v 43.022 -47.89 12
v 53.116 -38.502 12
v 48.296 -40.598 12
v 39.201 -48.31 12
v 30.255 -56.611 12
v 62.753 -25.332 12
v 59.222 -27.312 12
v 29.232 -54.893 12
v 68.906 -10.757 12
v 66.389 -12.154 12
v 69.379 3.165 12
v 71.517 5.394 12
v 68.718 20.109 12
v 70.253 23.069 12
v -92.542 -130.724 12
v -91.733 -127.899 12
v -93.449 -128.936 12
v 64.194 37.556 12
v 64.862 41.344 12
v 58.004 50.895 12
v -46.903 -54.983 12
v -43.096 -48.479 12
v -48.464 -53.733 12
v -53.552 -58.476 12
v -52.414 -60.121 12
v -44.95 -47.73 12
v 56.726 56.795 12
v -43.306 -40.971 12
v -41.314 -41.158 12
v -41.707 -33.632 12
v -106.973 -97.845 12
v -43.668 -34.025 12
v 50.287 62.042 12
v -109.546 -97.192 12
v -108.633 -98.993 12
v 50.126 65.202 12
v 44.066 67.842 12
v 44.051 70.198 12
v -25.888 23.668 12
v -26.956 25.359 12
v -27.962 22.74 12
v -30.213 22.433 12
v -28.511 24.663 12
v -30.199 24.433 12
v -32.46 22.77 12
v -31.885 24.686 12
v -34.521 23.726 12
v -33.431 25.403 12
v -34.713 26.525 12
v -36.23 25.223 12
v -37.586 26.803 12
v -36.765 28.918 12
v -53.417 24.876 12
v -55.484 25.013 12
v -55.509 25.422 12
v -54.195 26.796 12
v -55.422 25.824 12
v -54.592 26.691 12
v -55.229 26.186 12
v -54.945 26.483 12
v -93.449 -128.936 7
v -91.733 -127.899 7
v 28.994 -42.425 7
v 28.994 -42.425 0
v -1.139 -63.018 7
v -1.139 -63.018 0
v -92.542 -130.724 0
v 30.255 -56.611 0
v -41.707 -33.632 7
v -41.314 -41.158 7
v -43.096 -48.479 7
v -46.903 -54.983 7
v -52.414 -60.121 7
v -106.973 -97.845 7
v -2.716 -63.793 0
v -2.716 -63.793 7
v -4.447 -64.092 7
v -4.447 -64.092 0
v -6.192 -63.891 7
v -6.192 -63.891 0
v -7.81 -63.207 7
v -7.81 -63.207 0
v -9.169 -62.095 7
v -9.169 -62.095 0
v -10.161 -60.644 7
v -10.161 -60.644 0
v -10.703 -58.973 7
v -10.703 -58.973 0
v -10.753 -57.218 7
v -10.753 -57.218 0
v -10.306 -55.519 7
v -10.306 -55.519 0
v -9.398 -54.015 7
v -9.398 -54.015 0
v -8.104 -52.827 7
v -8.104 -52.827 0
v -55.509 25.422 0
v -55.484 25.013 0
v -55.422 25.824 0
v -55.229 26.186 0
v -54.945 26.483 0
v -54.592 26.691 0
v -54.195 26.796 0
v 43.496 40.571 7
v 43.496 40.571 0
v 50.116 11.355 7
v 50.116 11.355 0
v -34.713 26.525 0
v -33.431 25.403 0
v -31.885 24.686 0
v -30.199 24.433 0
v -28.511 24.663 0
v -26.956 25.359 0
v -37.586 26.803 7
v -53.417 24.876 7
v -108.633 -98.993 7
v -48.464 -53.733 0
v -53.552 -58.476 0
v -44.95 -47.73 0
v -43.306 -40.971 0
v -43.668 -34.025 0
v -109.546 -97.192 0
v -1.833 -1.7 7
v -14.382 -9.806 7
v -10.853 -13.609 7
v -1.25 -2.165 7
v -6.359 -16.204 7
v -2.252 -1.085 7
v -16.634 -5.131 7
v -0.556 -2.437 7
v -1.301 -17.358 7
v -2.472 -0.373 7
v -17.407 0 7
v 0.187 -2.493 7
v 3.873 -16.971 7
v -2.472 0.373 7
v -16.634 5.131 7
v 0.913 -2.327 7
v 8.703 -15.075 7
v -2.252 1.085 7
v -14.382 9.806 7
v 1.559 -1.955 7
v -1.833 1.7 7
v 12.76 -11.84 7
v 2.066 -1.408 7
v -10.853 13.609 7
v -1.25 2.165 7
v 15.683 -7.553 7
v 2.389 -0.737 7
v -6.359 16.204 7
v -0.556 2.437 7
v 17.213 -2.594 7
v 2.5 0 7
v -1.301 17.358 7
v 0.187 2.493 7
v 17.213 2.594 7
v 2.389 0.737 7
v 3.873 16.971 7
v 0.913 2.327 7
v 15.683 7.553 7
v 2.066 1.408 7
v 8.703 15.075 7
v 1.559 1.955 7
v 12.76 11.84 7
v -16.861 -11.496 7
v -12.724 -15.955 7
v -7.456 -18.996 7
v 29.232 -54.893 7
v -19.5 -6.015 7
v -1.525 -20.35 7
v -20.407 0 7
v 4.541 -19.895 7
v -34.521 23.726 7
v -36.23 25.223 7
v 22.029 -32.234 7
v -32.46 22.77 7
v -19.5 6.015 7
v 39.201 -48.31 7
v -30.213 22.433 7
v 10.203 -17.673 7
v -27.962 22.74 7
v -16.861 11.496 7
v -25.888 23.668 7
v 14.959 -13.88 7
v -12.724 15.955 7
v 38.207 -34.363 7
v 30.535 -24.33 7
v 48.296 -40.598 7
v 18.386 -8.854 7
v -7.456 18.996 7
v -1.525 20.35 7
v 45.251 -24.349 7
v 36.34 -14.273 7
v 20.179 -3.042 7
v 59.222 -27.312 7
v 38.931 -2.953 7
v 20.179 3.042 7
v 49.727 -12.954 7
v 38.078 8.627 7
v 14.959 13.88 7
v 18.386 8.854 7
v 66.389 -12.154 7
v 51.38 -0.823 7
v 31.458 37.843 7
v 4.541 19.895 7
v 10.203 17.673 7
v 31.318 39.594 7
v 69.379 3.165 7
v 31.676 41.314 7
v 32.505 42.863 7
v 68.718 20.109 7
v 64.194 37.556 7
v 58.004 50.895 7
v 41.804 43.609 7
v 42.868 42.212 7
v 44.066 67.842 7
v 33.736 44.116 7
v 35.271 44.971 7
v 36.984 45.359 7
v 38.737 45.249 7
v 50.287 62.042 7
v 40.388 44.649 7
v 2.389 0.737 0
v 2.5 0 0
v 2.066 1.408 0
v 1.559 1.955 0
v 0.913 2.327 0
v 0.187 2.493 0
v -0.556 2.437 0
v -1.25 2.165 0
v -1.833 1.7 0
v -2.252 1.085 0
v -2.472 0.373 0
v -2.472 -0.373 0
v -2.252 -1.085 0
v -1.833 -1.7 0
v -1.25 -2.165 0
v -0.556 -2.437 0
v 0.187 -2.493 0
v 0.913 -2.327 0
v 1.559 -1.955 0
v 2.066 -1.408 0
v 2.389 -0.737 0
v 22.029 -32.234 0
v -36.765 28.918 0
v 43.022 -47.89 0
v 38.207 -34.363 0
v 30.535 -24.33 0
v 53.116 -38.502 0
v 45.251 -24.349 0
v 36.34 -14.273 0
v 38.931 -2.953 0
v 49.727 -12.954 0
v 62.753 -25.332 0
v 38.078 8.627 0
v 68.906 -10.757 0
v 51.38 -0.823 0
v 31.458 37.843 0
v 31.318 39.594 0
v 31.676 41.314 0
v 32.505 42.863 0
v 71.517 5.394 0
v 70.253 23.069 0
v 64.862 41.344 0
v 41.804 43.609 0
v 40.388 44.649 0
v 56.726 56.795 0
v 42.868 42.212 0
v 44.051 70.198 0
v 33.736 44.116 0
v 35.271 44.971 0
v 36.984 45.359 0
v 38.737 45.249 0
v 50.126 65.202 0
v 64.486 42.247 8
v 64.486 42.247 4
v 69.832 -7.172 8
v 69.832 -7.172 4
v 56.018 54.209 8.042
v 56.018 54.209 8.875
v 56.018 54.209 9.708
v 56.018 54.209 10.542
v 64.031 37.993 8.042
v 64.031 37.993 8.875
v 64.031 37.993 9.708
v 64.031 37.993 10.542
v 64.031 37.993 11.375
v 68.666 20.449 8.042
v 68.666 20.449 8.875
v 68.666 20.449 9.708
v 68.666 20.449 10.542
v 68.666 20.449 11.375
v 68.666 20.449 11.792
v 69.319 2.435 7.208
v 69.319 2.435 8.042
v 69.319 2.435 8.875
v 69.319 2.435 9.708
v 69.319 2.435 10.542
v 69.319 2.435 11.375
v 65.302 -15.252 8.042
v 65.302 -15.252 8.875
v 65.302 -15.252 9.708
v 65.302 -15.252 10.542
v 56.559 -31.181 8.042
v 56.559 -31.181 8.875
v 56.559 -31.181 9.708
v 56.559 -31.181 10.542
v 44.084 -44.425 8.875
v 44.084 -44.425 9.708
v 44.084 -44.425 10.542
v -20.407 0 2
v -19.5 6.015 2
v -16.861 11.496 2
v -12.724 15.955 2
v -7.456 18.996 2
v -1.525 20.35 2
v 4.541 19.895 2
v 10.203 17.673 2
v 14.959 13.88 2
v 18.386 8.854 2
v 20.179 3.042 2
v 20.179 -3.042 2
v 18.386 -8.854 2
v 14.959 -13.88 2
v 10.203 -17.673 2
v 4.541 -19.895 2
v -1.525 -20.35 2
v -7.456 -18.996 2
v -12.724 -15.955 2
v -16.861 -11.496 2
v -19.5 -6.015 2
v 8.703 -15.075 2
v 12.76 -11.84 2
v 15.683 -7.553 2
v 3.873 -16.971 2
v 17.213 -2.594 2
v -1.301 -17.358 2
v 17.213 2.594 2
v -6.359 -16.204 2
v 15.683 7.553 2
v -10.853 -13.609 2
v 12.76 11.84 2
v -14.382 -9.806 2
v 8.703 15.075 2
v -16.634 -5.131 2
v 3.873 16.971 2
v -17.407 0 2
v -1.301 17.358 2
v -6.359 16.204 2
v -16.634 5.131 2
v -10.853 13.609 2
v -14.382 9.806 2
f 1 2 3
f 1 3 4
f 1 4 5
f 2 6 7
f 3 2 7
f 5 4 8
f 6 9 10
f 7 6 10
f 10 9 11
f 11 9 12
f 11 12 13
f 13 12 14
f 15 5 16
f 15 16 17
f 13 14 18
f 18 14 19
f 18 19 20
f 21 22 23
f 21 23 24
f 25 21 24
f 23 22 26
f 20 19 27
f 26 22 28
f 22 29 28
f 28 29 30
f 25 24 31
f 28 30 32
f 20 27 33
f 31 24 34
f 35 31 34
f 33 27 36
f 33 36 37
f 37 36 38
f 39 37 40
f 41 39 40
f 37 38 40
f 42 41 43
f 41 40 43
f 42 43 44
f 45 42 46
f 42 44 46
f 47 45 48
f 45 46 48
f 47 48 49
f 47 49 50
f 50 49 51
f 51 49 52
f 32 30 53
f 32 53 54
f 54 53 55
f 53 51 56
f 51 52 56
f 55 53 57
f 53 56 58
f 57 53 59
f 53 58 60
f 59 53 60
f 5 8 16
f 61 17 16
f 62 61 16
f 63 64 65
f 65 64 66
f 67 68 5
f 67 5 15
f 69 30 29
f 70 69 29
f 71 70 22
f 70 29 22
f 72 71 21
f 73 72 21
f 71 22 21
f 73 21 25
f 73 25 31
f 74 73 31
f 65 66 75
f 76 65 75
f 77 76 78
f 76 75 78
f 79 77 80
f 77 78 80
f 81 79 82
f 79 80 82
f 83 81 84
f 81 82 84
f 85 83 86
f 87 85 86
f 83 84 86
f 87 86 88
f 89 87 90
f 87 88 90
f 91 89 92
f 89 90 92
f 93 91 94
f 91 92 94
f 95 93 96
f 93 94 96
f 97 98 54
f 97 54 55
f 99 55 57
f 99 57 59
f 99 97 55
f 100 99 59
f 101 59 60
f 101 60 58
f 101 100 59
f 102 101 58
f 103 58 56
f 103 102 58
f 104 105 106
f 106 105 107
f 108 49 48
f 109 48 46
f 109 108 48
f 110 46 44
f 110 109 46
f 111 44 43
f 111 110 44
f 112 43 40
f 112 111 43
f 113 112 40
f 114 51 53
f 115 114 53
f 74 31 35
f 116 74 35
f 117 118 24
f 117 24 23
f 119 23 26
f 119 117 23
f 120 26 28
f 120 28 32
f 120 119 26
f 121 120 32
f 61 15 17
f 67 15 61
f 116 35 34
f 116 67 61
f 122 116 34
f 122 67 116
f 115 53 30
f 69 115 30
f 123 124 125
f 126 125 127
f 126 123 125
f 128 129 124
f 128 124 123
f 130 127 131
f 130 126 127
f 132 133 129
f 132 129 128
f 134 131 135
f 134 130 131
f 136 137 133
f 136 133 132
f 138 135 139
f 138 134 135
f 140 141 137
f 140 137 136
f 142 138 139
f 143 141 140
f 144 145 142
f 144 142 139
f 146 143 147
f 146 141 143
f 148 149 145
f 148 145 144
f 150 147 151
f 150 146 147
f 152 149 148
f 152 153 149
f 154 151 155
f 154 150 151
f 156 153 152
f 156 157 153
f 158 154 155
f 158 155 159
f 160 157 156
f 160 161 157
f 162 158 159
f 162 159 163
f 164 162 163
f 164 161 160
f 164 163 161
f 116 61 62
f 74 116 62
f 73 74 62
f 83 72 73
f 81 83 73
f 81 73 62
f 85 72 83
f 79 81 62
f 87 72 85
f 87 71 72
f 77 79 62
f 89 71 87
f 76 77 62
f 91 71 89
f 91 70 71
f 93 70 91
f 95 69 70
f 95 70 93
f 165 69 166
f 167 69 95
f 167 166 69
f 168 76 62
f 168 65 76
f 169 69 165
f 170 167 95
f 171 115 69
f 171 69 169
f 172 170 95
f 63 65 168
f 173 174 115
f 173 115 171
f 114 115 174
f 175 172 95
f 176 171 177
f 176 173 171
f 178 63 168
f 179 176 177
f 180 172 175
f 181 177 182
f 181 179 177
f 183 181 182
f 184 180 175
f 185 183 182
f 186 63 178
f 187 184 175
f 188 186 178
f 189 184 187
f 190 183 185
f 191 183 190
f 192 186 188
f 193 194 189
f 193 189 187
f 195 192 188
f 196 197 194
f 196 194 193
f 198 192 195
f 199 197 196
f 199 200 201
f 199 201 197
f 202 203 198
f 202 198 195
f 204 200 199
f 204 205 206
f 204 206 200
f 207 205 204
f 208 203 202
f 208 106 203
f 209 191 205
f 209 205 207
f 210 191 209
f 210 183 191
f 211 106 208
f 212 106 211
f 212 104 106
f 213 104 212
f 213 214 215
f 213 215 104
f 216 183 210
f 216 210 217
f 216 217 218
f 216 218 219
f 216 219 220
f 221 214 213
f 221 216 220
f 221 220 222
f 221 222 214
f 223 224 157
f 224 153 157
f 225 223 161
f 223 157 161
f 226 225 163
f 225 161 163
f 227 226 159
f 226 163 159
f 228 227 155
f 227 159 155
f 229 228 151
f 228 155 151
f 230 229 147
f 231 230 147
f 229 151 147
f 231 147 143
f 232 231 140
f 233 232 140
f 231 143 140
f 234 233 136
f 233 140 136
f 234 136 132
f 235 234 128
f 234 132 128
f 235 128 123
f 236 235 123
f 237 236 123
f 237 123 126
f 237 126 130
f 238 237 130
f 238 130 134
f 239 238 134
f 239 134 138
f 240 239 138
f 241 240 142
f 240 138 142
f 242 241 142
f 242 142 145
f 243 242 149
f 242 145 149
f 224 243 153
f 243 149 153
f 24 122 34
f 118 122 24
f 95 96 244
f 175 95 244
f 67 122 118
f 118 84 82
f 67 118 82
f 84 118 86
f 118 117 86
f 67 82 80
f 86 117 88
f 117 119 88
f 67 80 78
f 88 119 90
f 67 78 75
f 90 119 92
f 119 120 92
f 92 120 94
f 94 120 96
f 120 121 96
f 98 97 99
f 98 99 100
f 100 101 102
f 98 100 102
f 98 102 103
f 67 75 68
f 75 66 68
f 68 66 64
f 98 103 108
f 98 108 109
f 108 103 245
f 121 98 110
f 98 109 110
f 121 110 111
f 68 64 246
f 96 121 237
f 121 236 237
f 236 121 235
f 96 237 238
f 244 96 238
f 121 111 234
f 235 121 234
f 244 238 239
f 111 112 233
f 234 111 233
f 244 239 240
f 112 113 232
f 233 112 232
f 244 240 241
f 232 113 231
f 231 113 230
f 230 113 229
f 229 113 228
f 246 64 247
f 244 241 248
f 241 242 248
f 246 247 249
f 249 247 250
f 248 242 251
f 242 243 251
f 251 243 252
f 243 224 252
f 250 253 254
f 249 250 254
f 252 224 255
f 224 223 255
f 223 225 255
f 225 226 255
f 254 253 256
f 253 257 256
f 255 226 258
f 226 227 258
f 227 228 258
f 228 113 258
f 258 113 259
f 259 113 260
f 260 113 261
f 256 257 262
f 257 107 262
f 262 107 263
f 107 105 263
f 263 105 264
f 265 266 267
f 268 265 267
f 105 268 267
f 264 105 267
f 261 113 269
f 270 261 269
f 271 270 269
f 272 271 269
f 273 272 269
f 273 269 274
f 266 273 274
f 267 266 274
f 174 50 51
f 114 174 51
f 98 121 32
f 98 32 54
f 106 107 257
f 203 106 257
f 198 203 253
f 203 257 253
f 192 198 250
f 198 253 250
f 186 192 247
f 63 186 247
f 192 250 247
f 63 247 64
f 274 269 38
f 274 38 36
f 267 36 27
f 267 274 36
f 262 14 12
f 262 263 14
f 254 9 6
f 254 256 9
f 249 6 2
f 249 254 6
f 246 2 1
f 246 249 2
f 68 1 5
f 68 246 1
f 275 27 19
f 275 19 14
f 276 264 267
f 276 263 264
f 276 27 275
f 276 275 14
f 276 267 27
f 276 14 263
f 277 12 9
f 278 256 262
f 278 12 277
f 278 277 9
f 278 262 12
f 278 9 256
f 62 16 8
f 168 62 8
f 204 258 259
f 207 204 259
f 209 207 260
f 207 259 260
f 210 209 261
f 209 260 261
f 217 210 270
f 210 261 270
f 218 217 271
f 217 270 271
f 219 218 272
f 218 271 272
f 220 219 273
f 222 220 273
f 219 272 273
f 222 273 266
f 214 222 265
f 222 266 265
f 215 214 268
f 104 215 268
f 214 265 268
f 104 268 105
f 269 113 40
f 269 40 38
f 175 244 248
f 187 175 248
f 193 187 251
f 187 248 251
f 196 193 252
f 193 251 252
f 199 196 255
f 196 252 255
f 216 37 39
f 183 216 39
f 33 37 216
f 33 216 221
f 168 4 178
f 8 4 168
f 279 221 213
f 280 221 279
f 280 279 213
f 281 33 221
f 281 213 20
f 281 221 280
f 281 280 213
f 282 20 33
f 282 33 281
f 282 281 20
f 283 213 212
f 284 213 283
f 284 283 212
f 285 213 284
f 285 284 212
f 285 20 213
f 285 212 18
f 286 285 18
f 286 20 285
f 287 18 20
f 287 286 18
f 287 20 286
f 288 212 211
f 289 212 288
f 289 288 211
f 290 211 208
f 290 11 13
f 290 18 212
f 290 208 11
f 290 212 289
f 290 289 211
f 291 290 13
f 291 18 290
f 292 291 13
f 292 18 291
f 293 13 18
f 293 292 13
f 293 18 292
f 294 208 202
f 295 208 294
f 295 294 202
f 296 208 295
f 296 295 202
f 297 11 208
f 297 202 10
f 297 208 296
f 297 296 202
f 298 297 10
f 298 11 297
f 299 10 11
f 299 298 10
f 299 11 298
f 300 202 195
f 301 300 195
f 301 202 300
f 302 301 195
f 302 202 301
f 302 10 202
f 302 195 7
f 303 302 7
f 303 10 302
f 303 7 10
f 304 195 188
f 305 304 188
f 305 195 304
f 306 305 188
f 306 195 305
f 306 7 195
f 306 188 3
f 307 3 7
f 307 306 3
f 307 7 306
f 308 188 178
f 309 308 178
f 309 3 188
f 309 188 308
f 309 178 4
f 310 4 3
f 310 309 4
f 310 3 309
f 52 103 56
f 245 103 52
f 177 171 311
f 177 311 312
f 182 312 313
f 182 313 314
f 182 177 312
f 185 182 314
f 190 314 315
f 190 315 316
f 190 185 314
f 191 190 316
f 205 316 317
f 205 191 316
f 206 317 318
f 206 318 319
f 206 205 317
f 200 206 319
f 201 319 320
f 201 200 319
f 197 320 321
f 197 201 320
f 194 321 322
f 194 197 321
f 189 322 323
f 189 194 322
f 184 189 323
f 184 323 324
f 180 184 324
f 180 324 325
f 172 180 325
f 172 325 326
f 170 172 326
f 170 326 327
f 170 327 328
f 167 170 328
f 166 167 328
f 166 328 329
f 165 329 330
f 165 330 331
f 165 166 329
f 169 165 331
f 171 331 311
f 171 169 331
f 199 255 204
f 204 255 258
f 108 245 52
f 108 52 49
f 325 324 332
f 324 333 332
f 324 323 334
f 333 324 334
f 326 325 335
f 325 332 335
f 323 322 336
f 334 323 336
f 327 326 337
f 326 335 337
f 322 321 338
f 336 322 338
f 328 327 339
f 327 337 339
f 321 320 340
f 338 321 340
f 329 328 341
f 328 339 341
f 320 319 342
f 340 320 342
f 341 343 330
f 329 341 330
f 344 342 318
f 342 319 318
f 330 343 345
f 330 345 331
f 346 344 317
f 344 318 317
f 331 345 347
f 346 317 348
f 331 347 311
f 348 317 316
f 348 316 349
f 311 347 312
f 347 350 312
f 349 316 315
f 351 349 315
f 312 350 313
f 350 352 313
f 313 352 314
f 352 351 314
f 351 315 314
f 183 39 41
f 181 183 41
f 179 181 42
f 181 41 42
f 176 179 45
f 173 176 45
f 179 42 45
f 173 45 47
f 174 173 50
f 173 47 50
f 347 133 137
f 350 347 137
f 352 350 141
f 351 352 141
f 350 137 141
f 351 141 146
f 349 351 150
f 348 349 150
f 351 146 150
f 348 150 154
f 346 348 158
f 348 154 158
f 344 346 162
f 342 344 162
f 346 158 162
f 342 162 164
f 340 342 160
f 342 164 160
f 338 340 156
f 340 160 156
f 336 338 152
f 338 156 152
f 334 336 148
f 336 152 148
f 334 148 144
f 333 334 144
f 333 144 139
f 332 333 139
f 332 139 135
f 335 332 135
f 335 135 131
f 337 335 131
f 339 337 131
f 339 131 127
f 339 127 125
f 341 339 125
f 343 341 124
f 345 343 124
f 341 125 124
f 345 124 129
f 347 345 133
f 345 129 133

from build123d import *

# Parameters (mm, degrees)
SKETCH1_R           = 2.5
BOSS_EXTRUDE1_DEPTH = 12
CUT_EXTRUDE2_DEPTH  = 5
SKETCH2_R           = 20.406966807
SKETCH2_R_2         = 17.406966807
CUT_EXTRUDE1_DEPTH  = 5
SKETCH4_W           = 285.875648179
SKETCH4_H           = 19.682926892
CUT_EXTRUDE3_DEPTH  = 147.5


with BuildPart() as part:
    # Sketch1 → Boss-Extrude1 (new body)
    with BuildSketch(Plane.XY):
        with BuildLine():
            Line((-26.955627075, 25.359398414), (44.050751749, 70.198338512))
            add(Edge.make_bspline(
                [(44.050751749, 70.198338512), (62.087157858, 60.129124735), (102.236821697, -14.309839041), (30.255220871, -56.610877482)],
                knots=[0, 0, 0, 0, 1, 1, 1, 1], degree=3))
            Line((30.255220871, -56.610877482), (-92.542495842, -130.724182913))
            Line((-92.542495842, -130.724182913), (-109.546280871, -97.192243206))
            Line((-109.546280871, -97.192243206), (-53.551819625, -58.475967995))
            ThreePointArc((-53.551819625, -58.475967995), (-44.950344781, -47.729789478), (-43.667906214, -34.025006607))
            Line((-43.667906214, -34.025006607), (-55.484471769, 25.012678553))
            ThreePointArc((-55.484471769, 25.012678553), (-55.229156607, 26.186005417), (-54.194896814, 26.796077907))
            Line((-54.194896814, 26.796077907), (-36.765460017, 28.917713338))
            Line((-36.765460017, 28.917713338), (-34.712668517, 26.525380142))
            ThreePointArc((-34.712668517, 26.525380142), (-31.051074716, 24.4992182), (-26.955627075, 25.359398414))
        make_face()
        Circle(SKETCH1_R, mode=Mode.SUBTRACT)
        with BuildLine():
            Line((38.077539086, 8.627342387), (31.457970773, 37.843392922))
            ThreePointArc((31.457970773, 37.843392922), (36.113405951, 45.226418252), (43.49643128, 40.570983074))
            Line((43.49643128, 40.570983074), (50.115999593, 11.354932539))
            ThreePointArc((50.115999593, 11.354932539), (47.829544092, -18.785170217), (28.993629861, -42.425432651))
            Line((28.993629861, -42.425432651), (-1.139071825, -63.018184329))
            ThreePointArc((-1.139071825, -63.018184329), (-9.716926906, -61.404944758), (-8.103687335, -52.827089677))
            Line((-8.103687335, -52.827089677), (22.029014352, -32.234337999))
            ThreePointArc((22.029014352, -32.234337999), (36.340317452, -14.272748403), (38.077539086, 8.627342387))
        make_face(mode=Mode.SUBTRACT)
    boss_extrude1 = extrude(amount=-BOSS_EXTRUDE1_DEPTH)

    # Sketch3 → Cut-Extrude2 (cut)
    with BuildSketch(Plane(origin=(0, 0, -12), x_dir=(-1, 0, 0), z_dir=(0, 0, -1))):
        with BuildLine():
            Line((108.633361408, -98.992545924), (93.449492386, -128.935560359))
            Line((93.449492386, -128.935560359), (91.732523821, -127.89930155))
            Line((91.732523821, -127.89930155), (-29.231808811, -54.892516323))
            add(Edge.make_bspline(
                [(-44.065734477, 67.842412696), (-44.711989199, 67.409412256), (-45.319058391, 66.940521732), (-46.487121265, 65.960540056), (-47.04734625, 65.448744854), (-48.676831708, 63.866474713), (-49.695652132, 62.74980166), (-51.643061578, 60.433812481), (-52.570637695, 59.233568633), (-54.351661803, 56.76518688), (-55.206220539, 55.494184071), (-57.642169465, 51.637395526), (-59.108475151, 48.994377471), (-61.772216068, 43.585851359), (-62.968525898, 40.819830599), (-64.562191776, 36.579321004), (-65.059713989, 35.150465126), (-65.753925807, 32.983458962), (-65.976639631, 32.257164595), (-66.404295719, 30.796479627), (-66.609516748, 30.060994816), (-67.585549406, 26.379930292), (-68.207997329, 23.421535241), (-69.124162601, 17.476634327), (-69.417856055, 14.49012642), (-69.647875237, 8.486550939), (-69.584312973, 5.469492942), (-69.186185446, 0.918013899), (-69.001954276, -0.606436507), (-68.53395704, -3.614530288), (-68.249900615, -5.10403396), (-67.246805131, -9.528696616), (-66.377032654, -12.420063251), (-64.763908669, -16.667495261), (-64.174739481, -18.06835499), (-63.212508348, -20.146844678), (-62.87805617, -20.837039742), (-62.187699389, -22.200245629), (-61.831475952, -22.874060854), (-59.996492333, -26.20515645), (-58.3564207, -28.748698204), (-54.76187252, -33.614098874), (-52.807325031, -35.935907769), (-49.657387027, -39.264829798), (-48.576129174, -40.343226595), (-46.36681057, -42.431345516), (-45.23699415, -43.442927339), (-39.471767159, -48.350894333), (-34.491238963, -51.801735421), (-29.231808811, -54.892516323)],
                knots=[0, 0, 0, 0, 0.015625, 0.015625, 0.03125, 0.03125, 0.0625, 0.0625, 0.09375, 0.09375, 0.125, 0.125, 0.1875, 0.1875, 0.25, 0.25, 0.28125, 0.28125, 0.296875, 0.296875, 0.3125, 0.3125, 0.375, 0.375, 0.4375, 0.4375, 0.5, 0.5, 0.53125, 0.53125, 0.5625, 0.5625, 0.625, 0.625, 0.65625, 0.65625, 0.671875, 0.671875, 0.6875, 0.6875, 0.75, 0.75, 0.8125, 0.8125, 0.84375, 0.84375, 0.875, 0.875, 1, 1, 1, 1], degree=3))
            Line((-44.065734477, 67.842412696), (25.887763568, 23.668343261))
            ThreePointArc((25.887763568, 23.668343261), (31.348360423, 22.521436309), (36.230485491, 25.222985565))
            Line((36.230485491, 25.222985565), (37.586279366, 26.80303434))
            Line((37.586279366, 26.80303434), (53.417437888, 24.875952746))
            Line((53.417437888, 24.875952746), (41.706802558, -33.632485968))
            ThreePointArc((41.706802558, -33.632485968), (43.096111006, -48.479334078), (52.414375421, -60.121027471))
            Line((52.414375421, -60.121027471), (106.973050581, -97.844556472))
            Line((106.973050581, -97.844556472), (108.633361408, -98.992545924))
        make_face()
    cut_extrude2 = extrude(amount=-CUT_EXTRUDE2_DEPTH, mode=Mode.SUBTRACT)

    # Sketch2 → Cut-Extrude1 (cut)
    with BuildSketch(Plane(origin=(0, 0, -7), x_dir=(-1, 0, 0), z_dir=(0, 0, -1))):
        Circle(SKETCH2_R)
        Circle(SKETCH2_R_2, mode=Mode.SUBTRACT)
    cut_extrude1 = extrude(amount=-CUT_EXTRUDE1_DEPTH, mode=Mode.SUBTRACT)

    # Mirror2: Boss-Extrude1, Cut-Extrude2, Cut-Extrude1 across plane
    add(boss_extrude1.mirror(Plane.XY))
    add(cut_extrude2.mirror(Plane.XY), mode=Mode.SUBTRACT)
    add(cut_extrude1.mirror(Plane.XY), mode=Mode.SUBTRACT)

    # Sketch4 → Cut-Extrude3 (cut, symmetric)
    with BuildSketch(Plane(origin=(0, 0, 0), x_dir=(1, 0, 0), z_dir=(0, 1, 0))):
        with Locations((-41.859921239, 9.841463446)):
            Rectangle(SKETCH4_W, SKETCH4_H)
    extrude(amount=CUT_EXTRUDE3_DEPTH, both=True, mode=Mode.SUBTRACT)


solid = part.part
